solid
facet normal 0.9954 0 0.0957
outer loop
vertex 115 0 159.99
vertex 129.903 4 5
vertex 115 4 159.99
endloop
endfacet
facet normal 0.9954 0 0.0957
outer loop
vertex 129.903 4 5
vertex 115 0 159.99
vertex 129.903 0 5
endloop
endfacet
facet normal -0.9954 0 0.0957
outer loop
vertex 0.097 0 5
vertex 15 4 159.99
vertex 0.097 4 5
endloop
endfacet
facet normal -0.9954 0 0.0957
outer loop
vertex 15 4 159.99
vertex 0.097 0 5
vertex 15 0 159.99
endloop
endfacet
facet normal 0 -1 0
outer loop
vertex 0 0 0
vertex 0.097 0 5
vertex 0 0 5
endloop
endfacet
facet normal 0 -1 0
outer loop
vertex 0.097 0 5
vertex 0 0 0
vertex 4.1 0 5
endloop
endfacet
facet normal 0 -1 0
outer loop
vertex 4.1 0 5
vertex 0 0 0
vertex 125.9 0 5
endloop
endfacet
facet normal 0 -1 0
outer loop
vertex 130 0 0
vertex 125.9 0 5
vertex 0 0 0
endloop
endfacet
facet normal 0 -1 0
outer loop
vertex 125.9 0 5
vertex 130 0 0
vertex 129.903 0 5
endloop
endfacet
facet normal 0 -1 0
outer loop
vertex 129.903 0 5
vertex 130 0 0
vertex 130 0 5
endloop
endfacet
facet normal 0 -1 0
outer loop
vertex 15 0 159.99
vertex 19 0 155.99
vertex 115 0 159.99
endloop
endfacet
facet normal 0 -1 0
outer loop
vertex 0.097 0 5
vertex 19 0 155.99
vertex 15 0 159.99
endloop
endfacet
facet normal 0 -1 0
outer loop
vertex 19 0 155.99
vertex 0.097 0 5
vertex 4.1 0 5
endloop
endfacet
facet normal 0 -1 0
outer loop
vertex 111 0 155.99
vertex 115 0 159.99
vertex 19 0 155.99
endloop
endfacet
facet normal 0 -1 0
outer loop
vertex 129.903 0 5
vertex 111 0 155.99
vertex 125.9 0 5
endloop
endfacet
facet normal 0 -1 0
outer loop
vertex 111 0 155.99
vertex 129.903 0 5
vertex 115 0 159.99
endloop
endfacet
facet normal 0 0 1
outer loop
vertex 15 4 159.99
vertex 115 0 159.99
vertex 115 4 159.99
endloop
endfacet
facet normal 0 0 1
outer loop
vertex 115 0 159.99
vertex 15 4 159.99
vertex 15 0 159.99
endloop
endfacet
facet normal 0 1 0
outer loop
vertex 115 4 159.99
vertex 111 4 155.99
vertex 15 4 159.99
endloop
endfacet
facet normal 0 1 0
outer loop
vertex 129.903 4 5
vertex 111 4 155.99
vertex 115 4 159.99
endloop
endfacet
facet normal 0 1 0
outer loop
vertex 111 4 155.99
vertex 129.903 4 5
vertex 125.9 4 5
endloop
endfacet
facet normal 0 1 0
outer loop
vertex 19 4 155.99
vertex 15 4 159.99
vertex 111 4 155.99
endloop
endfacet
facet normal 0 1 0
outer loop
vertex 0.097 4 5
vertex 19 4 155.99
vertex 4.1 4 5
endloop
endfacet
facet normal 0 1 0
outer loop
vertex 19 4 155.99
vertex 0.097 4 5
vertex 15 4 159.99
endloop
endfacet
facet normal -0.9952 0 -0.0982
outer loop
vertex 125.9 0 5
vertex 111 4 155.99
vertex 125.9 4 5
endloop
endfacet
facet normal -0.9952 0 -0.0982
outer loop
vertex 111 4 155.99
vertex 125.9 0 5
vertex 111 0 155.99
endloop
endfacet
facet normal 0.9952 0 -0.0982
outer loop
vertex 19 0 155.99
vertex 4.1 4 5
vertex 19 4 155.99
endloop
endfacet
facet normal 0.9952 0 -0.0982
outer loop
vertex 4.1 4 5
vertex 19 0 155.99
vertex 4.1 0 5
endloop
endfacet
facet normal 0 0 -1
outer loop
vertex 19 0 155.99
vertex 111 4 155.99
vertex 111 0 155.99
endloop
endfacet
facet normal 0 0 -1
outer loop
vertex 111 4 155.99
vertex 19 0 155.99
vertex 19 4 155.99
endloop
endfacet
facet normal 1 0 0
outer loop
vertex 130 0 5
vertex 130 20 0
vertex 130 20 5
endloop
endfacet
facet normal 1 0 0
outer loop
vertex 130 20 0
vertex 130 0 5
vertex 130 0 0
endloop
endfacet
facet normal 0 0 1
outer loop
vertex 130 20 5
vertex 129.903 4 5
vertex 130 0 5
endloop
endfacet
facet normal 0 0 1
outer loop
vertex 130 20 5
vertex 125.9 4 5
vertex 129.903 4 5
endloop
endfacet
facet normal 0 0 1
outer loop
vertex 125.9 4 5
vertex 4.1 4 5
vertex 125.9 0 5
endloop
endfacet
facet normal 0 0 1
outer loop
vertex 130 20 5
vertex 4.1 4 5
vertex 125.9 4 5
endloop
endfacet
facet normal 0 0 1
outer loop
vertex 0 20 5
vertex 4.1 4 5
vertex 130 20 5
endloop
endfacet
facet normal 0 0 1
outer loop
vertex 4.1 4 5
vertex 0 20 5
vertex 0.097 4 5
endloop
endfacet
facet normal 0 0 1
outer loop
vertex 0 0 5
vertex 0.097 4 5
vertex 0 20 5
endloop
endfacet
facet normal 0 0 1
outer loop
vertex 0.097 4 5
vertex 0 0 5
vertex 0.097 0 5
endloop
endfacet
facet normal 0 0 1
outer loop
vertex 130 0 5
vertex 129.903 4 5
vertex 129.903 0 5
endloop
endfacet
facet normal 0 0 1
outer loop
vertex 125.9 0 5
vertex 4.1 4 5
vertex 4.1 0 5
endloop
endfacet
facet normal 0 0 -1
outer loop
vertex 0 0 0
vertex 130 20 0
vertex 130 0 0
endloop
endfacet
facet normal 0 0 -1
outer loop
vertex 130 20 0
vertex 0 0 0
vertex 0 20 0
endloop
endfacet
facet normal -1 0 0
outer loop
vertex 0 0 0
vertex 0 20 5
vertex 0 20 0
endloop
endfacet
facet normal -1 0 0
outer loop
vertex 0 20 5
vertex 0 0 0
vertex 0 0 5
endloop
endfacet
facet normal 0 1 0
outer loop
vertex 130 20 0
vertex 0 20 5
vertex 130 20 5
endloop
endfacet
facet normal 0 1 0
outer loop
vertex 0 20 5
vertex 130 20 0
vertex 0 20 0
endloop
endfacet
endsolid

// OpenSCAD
w1 = 100;
w2 = 130;
r = 16;
d = 4;
h = 160;
eps = 0.01;

footd = 5*d;


// foot

cube( [ w2, footd, 5 ] );

translate([ 0, d, -eps ])
rotate([90, 0, 0])
difference() {
    linear_extrude(d) {
        polygon([
            [ 0, d ],
            [ (w2-w1)/2, h],
            [ (w2+w1)/2, h],
            [ w2, d ]
        ]);
    };
    
    translate([0, 0, -eps])
    linear_extrude(d+2*eps) {
        polygon([
            [ d, d ],
            [ (w2-w1)/2+d, h-d],
            [ (w2+w1)/2-d, h-d],
            [ w2-d, d ]
        ]);
    };

 };
 
